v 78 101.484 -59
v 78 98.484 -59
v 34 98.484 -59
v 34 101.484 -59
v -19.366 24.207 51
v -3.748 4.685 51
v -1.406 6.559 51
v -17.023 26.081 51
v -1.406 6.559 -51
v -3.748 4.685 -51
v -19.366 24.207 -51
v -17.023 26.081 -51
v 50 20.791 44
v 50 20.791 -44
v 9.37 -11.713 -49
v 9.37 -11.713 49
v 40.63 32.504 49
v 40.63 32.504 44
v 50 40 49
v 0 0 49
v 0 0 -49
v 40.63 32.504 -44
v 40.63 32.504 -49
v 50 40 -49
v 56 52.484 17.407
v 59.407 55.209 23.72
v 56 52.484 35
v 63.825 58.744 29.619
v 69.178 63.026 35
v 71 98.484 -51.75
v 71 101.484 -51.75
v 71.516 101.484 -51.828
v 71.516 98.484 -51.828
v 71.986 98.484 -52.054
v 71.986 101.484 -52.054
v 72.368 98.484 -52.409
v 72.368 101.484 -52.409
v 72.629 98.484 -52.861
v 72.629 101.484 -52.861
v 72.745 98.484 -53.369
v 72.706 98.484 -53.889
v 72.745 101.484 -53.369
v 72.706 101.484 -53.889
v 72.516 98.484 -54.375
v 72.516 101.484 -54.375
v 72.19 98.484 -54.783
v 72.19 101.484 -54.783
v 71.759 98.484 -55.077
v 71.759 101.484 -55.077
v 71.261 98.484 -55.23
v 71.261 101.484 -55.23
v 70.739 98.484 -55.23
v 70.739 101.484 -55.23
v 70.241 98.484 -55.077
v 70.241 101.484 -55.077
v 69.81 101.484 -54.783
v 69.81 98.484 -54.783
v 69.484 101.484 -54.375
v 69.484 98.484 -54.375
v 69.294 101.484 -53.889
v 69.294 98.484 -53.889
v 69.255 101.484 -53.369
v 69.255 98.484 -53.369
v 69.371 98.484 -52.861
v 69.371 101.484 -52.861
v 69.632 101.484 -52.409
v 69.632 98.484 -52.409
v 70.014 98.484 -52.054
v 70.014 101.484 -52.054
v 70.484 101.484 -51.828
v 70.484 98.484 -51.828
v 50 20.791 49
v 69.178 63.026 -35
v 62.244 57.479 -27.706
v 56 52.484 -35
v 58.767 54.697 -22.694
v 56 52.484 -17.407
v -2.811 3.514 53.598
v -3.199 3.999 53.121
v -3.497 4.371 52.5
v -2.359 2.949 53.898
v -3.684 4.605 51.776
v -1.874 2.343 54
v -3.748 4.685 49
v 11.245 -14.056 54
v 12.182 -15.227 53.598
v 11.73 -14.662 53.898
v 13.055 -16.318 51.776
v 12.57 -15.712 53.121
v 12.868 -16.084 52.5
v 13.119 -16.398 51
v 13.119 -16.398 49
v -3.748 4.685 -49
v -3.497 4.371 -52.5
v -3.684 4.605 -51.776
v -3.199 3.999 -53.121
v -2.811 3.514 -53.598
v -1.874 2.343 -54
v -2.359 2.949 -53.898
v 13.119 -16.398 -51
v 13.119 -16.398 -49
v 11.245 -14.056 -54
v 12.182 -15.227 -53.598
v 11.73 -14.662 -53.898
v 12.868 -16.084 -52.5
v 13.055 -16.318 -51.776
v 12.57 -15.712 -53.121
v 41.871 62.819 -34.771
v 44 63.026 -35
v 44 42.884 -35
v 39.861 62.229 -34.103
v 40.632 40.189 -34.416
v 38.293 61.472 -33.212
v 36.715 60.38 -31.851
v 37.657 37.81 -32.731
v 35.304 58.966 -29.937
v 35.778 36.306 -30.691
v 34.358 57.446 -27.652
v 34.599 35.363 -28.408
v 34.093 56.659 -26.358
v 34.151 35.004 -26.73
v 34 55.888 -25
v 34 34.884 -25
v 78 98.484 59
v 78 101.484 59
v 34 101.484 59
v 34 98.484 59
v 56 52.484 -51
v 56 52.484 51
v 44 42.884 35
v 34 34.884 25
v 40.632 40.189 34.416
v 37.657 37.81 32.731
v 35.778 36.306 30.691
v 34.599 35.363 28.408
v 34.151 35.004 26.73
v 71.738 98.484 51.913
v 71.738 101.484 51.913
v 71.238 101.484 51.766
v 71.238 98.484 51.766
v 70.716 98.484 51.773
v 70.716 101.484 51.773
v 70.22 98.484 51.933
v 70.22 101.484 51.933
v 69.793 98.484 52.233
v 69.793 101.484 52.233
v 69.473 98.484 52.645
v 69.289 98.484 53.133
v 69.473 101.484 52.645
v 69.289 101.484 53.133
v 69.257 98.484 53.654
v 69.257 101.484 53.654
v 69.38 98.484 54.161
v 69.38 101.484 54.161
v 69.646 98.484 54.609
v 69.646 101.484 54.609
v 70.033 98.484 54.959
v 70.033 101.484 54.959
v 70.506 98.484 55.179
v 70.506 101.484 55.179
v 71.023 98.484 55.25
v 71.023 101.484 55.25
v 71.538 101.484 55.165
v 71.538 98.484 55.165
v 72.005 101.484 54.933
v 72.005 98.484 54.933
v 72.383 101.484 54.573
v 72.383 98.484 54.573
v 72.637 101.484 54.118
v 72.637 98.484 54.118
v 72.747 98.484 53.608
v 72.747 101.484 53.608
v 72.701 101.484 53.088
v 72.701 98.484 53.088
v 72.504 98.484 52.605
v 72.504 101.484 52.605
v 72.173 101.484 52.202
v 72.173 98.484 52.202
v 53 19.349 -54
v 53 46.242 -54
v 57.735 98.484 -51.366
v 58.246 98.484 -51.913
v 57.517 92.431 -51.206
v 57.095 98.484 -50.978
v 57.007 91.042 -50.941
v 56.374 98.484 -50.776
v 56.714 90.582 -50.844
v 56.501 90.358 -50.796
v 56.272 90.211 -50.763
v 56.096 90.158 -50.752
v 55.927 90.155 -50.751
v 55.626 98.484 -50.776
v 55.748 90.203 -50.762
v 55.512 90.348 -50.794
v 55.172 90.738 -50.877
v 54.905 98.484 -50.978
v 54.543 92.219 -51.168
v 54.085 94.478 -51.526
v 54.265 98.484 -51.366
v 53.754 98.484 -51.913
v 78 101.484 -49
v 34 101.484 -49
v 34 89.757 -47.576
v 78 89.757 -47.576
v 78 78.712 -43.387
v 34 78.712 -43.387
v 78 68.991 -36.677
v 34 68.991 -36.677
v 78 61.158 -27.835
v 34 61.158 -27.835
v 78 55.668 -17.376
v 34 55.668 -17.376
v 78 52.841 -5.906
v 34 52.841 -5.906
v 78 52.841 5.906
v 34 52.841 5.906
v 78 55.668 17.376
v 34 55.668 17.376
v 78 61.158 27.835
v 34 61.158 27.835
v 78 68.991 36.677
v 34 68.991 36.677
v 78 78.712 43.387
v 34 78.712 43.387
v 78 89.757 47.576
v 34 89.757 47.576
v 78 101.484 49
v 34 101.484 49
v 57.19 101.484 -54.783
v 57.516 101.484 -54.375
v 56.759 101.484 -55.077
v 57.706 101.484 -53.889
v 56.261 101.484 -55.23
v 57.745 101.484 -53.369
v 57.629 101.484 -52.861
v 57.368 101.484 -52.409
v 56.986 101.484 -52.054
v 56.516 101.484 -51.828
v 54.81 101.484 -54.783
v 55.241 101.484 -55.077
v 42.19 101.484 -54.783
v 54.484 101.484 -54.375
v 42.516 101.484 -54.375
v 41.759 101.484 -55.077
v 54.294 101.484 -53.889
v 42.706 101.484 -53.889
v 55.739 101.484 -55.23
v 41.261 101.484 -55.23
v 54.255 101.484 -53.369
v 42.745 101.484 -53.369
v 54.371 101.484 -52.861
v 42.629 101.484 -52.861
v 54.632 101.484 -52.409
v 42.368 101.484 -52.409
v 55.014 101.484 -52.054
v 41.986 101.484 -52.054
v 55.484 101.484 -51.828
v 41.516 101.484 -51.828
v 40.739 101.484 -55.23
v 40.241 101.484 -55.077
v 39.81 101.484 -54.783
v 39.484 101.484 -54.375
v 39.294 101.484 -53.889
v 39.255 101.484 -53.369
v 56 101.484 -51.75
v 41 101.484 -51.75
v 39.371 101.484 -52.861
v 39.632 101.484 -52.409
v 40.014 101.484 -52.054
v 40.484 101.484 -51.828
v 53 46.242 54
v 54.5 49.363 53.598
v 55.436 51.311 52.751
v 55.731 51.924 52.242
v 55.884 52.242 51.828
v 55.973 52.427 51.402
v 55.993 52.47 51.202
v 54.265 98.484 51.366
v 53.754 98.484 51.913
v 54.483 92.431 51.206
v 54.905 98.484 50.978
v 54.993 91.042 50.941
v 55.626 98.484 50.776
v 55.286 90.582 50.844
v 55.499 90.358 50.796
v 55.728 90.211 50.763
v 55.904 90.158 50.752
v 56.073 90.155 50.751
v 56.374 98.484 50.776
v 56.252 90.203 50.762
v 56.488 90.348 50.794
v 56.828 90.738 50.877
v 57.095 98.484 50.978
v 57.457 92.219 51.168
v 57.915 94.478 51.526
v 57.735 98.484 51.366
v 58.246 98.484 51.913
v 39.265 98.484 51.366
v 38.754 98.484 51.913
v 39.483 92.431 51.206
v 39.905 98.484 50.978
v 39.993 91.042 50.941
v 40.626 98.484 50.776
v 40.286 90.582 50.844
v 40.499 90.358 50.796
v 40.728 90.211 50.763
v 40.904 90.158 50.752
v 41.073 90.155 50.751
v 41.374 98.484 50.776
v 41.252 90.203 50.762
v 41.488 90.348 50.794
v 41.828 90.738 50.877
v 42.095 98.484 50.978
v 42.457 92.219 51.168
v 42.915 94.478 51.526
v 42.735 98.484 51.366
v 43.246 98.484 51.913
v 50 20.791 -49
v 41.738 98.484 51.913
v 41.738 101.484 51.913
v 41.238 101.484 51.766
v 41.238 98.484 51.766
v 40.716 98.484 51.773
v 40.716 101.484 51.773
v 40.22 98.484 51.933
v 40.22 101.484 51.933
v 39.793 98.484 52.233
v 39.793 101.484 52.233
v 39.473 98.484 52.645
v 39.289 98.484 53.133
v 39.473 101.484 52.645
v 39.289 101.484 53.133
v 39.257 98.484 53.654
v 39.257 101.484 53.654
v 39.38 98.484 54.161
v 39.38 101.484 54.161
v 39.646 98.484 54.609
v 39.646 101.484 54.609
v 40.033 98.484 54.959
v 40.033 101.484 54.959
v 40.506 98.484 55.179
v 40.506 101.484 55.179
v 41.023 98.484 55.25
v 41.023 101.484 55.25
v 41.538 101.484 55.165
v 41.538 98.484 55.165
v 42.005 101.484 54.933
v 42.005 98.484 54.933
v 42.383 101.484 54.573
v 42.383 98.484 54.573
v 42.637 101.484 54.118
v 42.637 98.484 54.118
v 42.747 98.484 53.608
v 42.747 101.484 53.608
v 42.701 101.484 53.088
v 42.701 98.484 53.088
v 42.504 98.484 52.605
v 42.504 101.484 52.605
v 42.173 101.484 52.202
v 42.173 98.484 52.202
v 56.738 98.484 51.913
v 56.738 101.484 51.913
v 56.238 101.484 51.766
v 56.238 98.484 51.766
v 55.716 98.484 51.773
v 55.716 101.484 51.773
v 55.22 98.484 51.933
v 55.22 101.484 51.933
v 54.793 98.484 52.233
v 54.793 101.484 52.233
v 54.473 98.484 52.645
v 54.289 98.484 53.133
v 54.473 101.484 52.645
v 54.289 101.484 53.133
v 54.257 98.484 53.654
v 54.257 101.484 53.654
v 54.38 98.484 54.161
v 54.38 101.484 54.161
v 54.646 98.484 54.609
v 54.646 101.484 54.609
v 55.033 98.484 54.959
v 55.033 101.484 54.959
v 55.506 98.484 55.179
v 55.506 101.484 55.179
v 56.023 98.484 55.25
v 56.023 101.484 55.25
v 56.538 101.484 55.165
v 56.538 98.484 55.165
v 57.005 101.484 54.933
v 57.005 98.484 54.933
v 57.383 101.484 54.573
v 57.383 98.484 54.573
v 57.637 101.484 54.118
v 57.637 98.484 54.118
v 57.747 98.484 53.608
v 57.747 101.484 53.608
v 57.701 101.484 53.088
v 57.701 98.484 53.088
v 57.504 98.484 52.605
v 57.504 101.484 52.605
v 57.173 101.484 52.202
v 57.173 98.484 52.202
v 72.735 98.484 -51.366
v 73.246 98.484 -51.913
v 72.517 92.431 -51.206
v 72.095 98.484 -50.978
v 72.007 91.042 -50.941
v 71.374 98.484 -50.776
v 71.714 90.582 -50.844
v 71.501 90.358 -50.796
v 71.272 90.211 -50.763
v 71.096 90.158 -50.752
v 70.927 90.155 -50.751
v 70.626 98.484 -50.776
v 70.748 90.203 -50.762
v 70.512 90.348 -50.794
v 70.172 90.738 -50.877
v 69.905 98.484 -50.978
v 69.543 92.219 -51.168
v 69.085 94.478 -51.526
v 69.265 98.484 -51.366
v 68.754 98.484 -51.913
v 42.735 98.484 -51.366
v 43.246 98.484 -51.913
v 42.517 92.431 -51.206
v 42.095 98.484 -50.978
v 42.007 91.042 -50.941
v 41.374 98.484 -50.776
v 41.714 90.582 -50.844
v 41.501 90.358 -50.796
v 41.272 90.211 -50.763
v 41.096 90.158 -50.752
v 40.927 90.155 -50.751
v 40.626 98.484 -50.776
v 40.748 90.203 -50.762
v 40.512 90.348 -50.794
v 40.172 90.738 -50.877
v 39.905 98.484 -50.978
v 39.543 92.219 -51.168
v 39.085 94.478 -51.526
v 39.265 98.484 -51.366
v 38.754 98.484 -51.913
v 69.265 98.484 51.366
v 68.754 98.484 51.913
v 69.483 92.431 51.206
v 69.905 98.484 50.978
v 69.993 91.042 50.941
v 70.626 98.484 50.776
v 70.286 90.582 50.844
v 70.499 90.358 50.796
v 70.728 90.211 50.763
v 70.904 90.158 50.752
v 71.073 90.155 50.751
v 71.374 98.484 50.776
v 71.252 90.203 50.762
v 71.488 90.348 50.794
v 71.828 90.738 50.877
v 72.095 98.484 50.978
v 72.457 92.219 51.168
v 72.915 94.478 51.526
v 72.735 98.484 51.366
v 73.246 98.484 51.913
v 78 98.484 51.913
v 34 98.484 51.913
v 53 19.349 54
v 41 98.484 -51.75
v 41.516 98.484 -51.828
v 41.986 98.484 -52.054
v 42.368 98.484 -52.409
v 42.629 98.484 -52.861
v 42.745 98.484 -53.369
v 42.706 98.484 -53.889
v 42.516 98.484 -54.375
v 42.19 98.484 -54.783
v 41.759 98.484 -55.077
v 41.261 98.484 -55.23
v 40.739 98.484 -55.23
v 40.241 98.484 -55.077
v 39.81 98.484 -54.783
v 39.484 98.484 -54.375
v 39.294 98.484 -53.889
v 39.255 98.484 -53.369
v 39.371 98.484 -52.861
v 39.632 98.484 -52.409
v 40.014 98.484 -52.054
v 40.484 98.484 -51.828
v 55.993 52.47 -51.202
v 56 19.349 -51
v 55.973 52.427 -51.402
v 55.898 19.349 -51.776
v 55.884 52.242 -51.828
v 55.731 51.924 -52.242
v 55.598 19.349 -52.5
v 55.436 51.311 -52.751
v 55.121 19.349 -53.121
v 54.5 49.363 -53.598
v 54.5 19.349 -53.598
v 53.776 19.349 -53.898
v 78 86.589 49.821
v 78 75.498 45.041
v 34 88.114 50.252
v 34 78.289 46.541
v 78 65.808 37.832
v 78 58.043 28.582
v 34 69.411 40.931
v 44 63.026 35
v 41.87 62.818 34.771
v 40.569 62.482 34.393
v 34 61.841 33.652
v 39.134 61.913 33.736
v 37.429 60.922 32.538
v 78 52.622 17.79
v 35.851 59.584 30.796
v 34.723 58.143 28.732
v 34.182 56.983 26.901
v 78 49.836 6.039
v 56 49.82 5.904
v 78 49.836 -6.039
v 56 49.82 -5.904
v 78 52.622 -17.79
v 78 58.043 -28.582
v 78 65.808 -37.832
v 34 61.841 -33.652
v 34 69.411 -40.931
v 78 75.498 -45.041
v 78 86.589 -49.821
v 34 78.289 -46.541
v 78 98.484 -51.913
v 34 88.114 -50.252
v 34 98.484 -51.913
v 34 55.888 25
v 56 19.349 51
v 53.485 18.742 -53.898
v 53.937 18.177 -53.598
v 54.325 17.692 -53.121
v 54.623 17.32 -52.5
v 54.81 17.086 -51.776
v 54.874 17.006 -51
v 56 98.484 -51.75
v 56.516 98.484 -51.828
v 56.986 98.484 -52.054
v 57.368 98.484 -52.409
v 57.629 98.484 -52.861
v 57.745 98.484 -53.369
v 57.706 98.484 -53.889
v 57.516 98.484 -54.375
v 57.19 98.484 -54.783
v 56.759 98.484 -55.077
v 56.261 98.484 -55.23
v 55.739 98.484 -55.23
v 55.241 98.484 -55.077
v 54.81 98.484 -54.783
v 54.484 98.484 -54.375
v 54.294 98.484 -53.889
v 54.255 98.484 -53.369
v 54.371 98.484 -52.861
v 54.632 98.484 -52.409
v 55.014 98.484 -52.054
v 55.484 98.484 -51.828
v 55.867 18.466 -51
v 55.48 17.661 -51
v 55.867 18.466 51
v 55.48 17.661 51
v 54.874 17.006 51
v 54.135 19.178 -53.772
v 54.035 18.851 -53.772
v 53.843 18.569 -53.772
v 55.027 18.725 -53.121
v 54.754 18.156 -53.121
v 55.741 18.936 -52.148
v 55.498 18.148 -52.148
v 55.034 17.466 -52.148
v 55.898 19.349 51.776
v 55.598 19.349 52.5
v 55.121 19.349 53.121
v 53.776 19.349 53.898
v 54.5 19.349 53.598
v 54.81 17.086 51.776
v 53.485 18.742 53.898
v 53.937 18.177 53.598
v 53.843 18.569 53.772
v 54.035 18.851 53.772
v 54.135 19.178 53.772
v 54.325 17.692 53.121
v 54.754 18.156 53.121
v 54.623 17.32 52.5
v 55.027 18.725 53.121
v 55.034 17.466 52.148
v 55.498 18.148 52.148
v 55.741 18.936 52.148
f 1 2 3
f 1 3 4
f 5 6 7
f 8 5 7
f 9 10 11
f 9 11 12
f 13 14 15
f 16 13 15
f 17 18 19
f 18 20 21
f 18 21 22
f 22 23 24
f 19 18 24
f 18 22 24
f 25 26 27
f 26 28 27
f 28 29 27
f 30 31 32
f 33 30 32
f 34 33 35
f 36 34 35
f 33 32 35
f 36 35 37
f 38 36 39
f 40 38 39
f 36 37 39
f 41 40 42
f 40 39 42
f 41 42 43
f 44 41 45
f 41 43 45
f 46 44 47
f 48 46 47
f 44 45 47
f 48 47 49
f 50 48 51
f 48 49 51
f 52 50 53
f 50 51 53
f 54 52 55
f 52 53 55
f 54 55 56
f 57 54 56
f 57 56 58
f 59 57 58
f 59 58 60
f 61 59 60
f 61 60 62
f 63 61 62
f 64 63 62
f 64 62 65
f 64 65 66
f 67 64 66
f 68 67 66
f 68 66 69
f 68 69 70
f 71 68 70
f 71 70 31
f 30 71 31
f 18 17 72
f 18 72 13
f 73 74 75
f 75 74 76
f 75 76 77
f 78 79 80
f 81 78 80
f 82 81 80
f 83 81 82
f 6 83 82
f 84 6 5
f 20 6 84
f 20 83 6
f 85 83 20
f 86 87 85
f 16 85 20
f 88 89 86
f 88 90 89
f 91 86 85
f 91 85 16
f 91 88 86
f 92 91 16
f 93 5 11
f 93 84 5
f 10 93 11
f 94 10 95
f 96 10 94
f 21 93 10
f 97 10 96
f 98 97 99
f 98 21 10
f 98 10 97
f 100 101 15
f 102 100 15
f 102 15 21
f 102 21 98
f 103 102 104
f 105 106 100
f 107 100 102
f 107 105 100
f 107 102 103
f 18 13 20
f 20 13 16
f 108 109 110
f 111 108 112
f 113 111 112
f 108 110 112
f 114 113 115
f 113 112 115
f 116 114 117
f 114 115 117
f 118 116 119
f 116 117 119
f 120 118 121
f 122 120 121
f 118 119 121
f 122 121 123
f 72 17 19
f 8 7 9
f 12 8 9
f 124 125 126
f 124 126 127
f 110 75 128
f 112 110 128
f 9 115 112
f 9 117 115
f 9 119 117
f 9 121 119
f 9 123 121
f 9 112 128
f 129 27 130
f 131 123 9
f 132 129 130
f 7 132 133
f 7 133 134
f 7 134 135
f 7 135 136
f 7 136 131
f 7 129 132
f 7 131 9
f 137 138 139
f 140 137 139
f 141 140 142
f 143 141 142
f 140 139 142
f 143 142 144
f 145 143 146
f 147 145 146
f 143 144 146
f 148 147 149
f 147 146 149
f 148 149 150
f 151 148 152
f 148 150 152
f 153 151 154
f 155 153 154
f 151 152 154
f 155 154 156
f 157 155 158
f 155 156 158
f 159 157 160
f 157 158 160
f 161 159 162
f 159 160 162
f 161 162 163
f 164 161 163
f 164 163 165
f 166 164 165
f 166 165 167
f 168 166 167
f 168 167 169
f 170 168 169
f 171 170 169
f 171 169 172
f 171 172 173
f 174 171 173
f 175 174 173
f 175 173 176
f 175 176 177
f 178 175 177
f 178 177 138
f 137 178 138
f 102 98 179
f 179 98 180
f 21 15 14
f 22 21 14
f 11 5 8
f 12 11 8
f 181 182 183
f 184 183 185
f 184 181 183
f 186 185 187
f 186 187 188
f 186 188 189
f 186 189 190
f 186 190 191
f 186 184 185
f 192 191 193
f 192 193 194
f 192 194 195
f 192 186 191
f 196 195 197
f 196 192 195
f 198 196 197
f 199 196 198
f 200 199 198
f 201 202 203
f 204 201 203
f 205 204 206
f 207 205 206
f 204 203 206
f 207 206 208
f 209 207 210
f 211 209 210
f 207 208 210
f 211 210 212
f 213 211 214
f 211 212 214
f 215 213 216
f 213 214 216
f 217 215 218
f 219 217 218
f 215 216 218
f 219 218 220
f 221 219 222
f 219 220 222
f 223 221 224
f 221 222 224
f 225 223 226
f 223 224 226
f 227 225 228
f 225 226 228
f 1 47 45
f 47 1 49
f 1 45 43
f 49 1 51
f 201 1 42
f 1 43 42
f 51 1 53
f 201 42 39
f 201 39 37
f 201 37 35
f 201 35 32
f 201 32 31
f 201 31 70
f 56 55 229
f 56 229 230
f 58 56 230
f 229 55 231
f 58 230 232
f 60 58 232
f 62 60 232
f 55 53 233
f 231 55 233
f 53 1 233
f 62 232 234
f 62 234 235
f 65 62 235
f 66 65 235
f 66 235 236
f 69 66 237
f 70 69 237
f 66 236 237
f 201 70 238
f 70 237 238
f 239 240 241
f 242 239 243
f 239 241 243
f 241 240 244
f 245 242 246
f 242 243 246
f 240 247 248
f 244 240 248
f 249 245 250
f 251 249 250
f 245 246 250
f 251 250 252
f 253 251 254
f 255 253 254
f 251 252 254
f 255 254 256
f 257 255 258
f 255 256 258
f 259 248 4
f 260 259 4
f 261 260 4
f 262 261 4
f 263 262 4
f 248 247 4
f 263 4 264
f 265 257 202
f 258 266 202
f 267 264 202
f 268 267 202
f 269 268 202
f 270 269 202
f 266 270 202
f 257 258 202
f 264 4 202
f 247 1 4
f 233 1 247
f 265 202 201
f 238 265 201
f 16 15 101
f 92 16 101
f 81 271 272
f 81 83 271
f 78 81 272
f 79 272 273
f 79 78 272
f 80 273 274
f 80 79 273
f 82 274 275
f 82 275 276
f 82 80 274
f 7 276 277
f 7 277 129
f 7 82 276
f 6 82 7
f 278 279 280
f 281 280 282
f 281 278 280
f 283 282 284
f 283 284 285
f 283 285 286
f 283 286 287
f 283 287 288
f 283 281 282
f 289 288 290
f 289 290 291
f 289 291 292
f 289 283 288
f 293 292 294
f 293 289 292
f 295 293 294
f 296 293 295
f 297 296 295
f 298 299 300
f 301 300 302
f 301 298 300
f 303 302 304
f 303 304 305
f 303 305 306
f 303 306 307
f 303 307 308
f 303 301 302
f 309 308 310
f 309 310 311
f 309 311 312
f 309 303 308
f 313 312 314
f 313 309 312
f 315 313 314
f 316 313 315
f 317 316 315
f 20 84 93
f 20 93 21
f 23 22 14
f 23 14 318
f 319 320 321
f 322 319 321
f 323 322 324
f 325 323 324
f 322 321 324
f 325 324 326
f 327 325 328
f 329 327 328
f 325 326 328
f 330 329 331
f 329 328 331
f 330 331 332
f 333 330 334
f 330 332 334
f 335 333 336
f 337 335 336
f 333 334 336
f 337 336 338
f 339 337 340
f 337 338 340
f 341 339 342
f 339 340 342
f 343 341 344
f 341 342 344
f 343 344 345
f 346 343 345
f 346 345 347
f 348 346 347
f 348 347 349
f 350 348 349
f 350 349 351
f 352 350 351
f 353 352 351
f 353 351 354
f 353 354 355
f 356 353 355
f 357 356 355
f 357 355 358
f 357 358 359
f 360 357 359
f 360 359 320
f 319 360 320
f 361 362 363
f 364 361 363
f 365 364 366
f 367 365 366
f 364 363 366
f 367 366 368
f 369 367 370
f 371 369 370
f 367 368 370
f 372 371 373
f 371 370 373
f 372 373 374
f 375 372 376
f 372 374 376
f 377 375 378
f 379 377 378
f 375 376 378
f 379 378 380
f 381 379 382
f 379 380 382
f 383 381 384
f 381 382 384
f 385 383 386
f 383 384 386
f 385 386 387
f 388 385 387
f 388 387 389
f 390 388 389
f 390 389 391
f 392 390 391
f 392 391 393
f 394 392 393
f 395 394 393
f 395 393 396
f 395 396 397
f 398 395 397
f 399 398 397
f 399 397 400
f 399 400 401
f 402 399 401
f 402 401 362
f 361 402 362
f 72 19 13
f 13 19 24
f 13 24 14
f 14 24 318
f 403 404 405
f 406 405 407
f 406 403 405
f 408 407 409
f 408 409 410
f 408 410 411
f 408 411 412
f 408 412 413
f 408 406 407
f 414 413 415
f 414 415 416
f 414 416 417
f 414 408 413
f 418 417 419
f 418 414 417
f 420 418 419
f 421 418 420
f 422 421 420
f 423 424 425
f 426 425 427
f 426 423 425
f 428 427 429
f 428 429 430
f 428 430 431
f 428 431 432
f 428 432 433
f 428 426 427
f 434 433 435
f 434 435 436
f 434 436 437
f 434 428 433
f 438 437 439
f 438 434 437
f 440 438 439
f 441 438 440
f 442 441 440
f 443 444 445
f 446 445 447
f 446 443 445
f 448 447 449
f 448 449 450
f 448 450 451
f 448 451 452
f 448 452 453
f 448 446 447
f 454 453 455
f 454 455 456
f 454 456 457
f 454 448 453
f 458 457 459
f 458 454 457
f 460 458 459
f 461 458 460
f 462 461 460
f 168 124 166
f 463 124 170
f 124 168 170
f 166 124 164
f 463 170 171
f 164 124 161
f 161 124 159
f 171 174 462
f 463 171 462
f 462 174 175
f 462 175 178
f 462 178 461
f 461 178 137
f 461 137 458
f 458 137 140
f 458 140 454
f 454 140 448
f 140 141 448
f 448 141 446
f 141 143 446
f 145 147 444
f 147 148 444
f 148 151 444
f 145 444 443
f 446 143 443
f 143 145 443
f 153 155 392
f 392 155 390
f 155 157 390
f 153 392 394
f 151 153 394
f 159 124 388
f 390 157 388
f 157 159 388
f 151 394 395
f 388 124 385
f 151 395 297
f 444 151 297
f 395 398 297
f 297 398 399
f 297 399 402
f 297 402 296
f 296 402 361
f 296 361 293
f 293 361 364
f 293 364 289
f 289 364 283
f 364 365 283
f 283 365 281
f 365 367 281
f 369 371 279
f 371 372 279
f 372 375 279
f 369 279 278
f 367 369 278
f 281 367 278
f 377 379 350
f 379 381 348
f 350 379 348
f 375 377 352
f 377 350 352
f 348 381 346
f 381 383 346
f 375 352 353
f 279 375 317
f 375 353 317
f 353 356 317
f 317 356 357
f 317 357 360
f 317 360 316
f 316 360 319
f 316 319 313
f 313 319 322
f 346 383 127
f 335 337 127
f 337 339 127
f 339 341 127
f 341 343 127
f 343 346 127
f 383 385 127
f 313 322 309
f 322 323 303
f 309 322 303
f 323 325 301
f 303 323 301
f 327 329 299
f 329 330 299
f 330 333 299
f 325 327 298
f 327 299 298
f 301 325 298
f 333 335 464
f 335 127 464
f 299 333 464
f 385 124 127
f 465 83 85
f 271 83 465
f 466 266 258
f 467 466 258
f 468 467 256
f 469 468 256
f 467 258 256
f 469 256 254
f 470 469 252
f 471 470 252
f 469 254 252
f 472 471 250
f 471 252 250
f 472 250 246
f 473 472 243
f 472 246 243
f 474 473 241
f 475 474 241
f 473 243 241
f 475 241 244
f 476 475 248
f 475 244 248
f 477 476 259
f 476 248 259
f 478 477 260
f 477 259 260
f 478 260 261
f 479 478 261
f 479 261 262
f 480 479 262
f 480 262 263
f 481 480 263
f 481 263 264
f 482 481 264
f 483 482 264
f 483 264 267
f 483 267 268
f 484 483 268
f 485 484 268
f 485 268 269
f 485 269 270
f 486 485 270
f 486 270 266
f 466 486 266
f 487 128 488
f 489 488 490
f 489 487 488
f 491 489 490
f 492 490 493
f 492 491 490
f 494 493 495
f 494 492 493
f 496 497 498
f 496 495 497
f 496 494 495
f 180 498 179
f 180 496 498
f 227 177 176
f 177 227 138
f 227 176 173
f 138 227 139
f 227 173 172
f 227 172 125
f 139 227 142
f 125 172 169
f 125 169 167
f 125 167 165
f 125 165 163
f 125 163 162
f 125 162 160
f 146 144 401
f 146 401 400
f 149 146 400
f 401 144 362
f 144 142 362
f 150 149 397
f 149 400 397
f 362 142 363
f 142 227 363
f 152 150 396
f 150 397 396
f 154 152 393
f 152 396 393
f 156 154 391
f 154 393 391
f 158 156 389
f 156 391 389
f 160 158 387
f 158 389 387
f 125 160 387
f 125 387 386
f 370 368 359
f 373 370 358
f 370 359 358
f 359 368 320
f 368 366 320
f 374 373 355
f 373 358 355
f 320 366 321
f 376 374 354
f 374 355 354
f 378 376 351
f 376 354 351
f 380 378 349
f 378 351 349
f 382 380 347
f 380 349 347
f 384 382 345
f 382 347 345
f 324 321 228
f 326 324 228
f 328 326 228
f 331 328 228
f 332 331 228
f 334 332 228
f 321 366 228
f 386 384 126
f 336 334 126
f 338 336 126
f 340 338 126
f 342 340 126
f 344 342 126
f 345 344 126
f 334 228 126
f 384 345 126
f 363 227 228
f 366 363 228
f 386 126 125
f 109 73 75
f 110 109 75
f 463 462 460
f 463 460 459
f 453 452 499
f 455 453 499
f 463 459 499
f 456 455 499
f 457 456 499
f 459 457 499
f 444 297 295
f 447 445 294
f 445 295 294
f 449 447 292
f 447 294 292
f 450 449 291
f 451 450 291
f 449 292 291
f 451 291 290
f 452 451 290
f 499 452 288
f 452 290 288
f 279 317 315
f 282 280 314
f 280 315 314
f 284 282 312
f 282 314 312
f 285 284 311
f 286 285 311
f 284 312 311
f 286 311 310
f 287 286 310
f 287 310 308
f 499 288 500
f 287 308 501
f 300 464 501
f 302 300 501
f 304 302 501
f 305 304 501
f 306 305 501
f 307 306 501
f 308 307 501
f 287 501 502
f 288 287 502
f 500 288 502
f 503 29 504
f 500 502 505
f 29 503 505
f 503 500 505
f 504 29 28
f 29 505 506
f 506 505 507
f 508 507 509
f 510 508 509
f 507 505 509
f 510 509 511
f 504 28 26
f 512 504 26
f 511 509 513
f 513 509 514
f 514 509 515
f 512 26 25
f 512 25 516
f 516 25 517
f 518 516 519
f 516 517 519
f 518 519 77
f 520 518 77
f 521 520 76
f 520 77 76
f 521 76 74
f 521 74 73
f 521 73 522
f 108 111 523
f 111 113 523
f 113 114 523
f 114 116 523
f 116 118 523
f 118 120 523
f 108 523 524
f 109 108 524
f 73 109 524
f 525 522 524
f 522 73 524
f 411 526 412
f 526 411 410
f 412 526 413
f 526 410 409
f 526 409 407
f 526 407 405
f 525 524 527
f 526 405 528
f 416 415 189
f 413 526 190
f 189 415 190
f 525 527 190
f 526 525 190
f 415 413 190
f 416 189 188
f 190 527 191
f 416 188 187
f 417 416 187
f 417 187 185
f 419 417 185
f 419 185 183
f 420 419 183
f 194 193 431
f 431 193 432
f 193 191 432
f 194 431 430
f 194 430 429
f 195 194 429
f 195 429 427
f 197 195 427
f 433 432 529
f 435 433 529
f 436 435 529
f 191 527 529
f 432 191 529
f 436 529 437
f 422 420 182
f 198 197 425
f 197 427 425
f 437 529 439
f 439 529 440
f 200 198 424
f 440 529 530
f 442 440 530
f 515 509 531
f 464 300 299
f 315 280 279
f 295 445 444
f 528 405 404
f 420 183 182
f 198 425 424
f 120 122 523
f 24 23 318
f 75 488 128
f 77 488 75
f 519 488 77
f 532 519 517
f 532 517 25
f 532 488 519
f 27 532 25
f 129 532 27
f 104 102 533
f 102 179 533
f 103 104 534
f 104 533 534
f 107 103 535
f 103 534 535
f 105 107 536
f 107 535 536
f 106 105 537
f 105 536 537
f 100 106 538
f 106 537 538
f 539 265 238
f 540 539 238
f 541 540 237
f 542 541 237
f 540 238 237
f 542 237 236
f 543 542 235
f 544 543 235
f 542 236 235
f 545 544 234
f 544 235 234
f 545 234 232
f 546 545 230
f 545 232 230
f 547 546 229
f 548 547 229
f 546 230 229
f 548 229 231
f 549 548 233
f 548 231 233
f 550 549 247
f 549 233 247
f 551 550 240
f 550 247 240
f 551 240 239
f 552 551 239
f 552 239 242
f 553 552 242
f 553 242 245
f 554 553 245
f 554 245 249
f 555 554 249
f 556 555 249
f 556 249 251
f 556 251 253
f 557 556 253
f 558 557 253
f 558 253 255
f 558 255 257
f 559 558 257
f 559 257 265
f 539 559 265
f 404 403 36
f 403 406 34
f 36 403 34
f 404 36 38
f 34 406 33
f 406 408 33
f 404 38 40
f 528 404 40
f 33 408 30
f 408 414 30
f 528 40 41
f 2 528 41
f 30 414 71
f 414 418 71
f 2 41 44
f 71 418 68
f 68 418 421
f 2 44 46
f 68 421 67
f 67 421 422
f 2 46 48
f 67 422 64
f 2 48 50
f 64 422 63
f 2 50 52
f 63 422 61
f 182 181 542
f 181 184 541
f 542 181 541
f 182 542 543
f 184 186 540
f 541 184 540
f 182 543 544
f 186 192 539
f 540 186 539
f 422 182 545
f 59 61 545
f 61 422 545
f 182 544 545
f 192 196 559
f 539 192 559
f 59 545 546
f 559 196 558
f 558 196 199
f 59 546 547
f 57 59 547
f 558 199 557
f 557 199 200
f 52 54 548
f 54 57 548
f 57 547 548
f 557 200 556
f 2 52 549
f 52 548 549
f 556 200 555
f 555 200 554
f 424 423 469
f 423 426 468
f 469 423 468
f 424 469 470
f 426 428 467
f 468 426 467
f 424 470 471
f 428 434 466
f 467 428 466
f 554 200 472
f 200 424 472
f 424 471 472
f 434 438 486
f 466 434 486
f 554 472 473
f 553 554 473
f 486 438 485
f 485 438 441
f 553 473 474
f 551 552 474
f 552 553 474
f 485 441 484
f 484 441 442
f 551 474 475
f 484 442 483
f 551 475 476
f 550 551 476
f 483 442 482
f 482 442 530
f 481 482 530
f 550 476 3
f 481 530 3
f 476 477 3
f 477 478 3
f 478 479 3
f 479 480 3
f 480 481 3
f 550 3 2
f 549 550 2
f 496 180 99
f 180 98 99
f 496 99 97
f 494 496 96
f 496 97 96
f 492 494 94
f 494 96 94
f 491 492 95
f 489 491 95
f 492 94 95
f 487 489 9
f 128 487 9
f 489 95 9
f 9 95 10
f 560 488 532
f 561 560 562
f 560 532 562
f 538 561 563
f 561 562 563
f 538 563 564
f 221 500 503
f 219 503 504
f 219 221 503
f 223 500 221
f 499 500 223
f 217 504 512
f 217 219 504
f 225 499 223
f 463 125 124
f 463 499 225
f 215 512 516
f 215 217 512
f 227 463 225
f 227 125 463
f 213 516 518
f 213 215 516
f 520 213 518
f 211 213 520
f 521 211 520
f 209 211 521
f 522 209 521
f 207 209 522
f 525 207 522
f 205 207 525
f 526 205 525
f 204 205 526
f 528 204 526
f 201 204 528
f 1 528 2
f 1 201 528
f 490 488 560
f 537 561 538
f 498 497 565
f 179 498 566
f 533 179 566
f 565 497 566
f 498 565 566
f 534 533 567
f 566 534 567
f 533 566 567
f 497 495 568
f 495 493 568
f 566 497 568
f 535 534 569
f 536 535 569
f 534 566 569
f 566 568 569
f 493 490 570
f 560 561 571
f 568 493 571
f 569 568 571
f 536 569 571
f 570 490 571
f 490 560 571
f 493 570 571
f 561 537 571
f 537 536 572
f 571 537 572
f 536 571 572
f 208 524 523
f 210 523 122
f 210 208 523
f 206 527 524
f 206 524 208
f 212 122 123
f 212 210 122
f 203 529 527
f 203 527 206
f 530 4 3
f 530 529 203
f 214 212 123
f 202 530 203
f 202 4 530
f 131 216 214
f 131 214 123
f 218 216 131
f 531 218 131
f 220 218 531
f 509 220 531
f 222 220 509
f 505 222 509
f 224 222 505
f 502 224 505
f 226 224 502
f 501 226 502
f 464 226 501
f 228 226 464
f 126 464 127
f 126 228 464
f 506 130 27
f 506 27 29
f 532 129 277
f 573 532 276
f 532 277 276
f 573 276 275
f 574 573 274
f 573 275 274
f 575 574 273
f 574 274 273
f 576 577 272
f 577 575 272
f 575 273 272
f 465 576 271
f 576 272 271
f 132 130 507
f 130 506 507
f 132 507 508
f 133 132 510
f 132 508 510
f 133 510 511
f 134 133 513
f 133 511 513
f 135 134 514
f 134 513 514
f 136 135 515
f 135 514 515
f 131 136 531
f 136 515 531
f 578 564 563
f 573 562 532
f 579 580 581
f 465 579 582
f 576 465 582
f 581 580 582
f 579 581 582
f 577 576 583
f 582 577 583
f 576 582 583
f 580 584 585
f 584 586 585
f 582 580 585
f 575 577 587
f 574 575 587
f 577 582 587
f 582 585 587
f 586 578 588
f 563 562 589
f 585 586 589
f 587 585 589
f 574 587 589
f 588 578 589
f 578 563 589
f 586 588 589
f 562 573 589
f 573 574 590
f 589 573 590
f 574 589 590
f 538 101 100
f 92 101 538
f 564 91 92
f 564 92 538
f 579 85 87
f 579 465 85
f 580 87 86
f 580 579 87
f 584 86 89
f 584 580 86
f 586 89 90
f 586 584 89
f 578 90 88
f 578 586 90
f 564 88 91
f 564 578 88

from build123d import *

# Parameters (mm, degrees)
BOSS_EXTRUDE1_DEPTH      = 49
BOSS_EXTRUDE1_DEPTH_BACK = 49
BOSS_EXTRUDE2_DEPTH      = 5
BOSS_EXTRUDE4_DEPTH      = 15
BOSS_EXTRUDE5_DEPTH      = 22
BOSS_EXTRUDE5_DEPTH_BACK = 22
BOSS_EXTRUDE6_REACH      = 127.363
SKETCH7_R                = 1.75
CUT_EXTRUDE1_DEPTH       = 25
SKETCH8_R                = 2.75
CUT_EXTRUDE2_DEPTH       = 25
FILLET1_R                = 10
FILLET2_R                = 3
SKETCH9_W                = 3
SKETCH9_H                = 102
BOSS_EXTRUDE7_DEPTH      = 25


with BuildPart() as part:
    # Sketch1 → Boss-Extrude1 (new, two sides: drawn at the far end of the back side and taken through both)
    with BuildSketch(Plane.XY.offset(-BOSS_EXTRUDE1_DEPTH_BACK)):
        Polygon((0, 0), (50, 40), (50, 20.790627288), (9.370425713, -11.713032142), (13.118595999, -16.398244998), (56, 17.906878203), (56, 52.483749085), (-3.748170285, 4.685212857), align=None)
    extrude(amount=BOSS_EXTRUDE1_DEPTH + BOSS_EXTRUDE1_DEPTH_BACK)

    # Sketch2 → Boss-Extrude2 (add)
    with BuildSketch(Plane.XY.offset(49)):
        Polygon((-3.748170285, 4.685212857), (13.118595999, -16.398244998), (56, 17.906878203), (56, 52.483749085), align=None)
    boss_extrude2 = extrude(amount=BOSS_EXTRUDE2_DEPTH)

    # Mirror1: Boss-Extrude2 across plane
    add(boss_extrude2.mirror(Plane.XY))

    # Sketch4 → Boss-Extrude4 (add)
    with BuildSketch(Plane(origin=(9.370425713, -11.713032142, 0), x_dir=(0.7808688094430303, 0.6246950475544244, 0), z_dir=(-0.6246950475544244, 0.7808688094430304, 0))):
        Polygon((52.031242374, 49), (0, 49), (52.031242374, 44), align=None)
        Polygon((52.031242374, -49), (52.031242374, -44), (0, -49), align=None)
    extrude(amount=BOSS_EXTRUDE4_DEPTH)

    # Sketch5 → Boss-Extrude5 (add, two sides: drawn at the far end of the back side and taken through both)
    with BuildSketch(Plane(origin=(56, 0, 0), x_dir=(0, 0, -1), z_dir=(1, 0, 0)).offset(-BOSS_EXTRUDE5_DEPTH_BACK)):
        with BuildLine():
            Line((-49, 101.483749085), (-59, 101.483749085))
            Line((-59, 101.483749085), (-59, 98.483749085))
            Line((-59, 98.483749085), (-51.91338941, 98.483749085))
            ThreePointArc((-51.91338941, 98.483749085), (0, 49.483749085), (51.91338941, 98.483749085))
            Line((51.91338941, 98.483749085), (59, 98.483749085))
            Line((59, 98.483749085), (59, 101.483749085))
            Line((59, 101.483749085), (49, 101.483749085))
            ThreePointArc((49, 101.483749085), (0, 52.483749085), (-49, 101.483749085))
        make_face()
    extrude(amount=BOSS_EXTRUDE5_DEPTH + BOSS_EXTRUDE5_DEPTH_BACK)

    # Boss-Extrude6: up to this face of the body (flat: up to its plane)
    boss_extrude6_end = Plane(part.part.faces().sort_by_distance((25.735702215, 28.272310857, 0))[0])
    # Sketch6 → Boss-Extrude6 (add, up to the picked face)
    with BuildSketch(Plane.ZY.offset(-34), mode=Mode.PRIVATE) as boss_extrude6_sk1:
        with BuildLine():
            Line((-35, 63.025980039), (-35, 33.025980039))
            Line((-35, 33.025980039), (35, 33.025980039))
            Line((35, 33.025980039), (35, 63.025980039))
            ThreePointArc((35, 63.025980039), (0, 49.483749085), (-35, 63.025980039))
        make_face()
    boss_extrude6_tool1 = split(extrude(boss_extrude6_sk1.sketch, amount=-BOSS_EXTRUDE6_REACH, mode=Mode.PRIVATE), bisect_by=boss_extrude6_end, keep=Keep.BOTH, mode=Mode.PRIVATE)
    add(boss_extrude6_tool1.solids().sort_by(Axis((34, 43.754603, 0), (1, 0, 0)))[0])

    # Sketch7 → Cut-Extrude1 (cut)
    with BuildSketch(Plane(origin=(0, 101.483749085, 0), x_dir=(1, 0, 0), z_dir=(0, 1, 0))):
        with Locations(Location((56, 53.5, 0), (0, 0, 270))):
            Circle(SKETCH7_R)
        with Locations(Location((41, 53.5, 0), (0, 0, 270))):
            Circle(SKETCH7_R)
        with Locations(Location((71, 53.5, 0), (0, 0, 270))):
            Circle(SKETCH7_R)
        with Locations(Location((71, -53.5, 0), (0, 0, 65.044347067))):
            Circle(SKETCH7_R)
        with Locations(Location((56, -53.5, 0), (0, 0, 65.044347067))):
            Circle(SKETCH7_R)
        with Locations(Location((41, -53.5, 0), (0, 0, 65.044347067))):
            Circle(SKETCH7_R)
    extrude(amount=-CUT_EXTRUDE1_DEPTH, mode=Mode.SUBTRACT)

    # Sketch8 → Cut-Extrude2 (cut)
    with BuildSketch(Plane.XZ.offset(-98.483749085)):
        with Locations((41, -53.5)):
            Circle(SKETCH8_R)
        with Locations((56, -53.5)):
            Circle(SKETCH8_R)
        with Locations((71, -53.5)):
            Circle(SKETCH8_R)
        with Locations((71, 53.5)):
            Circle(SKETCH8_R)
        with Locations((56, 53.5)):
            Circle(SKETCH8_R)
        with Locations((41, 53.5)):
            Circle(SKETCH8_R)
    extrude(amount=CUT_EXTRUDE2_DEPTH, mode=Mode.SUBTRACT)

    # Fillet1
    fillet1_edges = [part.edges().sort_by_distance(p)[0] for p in [
        (34, 48.954864562, 35),
        (34, 48.954864562, -35),
    ]]
    fillet(fillet1_edges, radius=FILLET1_R)

    # Fillet2
    fillet2_edges = [part.edges().sort_by_distance(p)[0] for p in [
        (56, 17.906878203, 0),
        (26.125914857, 28.584480971, 54),
        (34.559297999, 0.754316602, 54),
        (56, 35.195313644, 54),
        (26.125914857, 28.584480971, -54),
        (56, 35.195313644, -54),
        (34.559297999, 0.754316602, -54),
    ]]
    fillet(fillet2_edges, radius=FILLET2_R)

    # Sketch9 → Boss-Extrude7 (add)
    with BuildSketch(Plane(origin=(-3.748170285, 4.685212857, 0), x_dir=(0.7808688094430302, 0.6246950475544245, 0), z_dir=(-0.6246950475544245, 0.7808688094430302, 0))):
        with Locations((1.5, 0)):
            Rectangle(SKETCH9_W, SKETCH9_H)
    extrude(amount=BOSS_EXTRUDE7_DEPTH)


solid = part.part
